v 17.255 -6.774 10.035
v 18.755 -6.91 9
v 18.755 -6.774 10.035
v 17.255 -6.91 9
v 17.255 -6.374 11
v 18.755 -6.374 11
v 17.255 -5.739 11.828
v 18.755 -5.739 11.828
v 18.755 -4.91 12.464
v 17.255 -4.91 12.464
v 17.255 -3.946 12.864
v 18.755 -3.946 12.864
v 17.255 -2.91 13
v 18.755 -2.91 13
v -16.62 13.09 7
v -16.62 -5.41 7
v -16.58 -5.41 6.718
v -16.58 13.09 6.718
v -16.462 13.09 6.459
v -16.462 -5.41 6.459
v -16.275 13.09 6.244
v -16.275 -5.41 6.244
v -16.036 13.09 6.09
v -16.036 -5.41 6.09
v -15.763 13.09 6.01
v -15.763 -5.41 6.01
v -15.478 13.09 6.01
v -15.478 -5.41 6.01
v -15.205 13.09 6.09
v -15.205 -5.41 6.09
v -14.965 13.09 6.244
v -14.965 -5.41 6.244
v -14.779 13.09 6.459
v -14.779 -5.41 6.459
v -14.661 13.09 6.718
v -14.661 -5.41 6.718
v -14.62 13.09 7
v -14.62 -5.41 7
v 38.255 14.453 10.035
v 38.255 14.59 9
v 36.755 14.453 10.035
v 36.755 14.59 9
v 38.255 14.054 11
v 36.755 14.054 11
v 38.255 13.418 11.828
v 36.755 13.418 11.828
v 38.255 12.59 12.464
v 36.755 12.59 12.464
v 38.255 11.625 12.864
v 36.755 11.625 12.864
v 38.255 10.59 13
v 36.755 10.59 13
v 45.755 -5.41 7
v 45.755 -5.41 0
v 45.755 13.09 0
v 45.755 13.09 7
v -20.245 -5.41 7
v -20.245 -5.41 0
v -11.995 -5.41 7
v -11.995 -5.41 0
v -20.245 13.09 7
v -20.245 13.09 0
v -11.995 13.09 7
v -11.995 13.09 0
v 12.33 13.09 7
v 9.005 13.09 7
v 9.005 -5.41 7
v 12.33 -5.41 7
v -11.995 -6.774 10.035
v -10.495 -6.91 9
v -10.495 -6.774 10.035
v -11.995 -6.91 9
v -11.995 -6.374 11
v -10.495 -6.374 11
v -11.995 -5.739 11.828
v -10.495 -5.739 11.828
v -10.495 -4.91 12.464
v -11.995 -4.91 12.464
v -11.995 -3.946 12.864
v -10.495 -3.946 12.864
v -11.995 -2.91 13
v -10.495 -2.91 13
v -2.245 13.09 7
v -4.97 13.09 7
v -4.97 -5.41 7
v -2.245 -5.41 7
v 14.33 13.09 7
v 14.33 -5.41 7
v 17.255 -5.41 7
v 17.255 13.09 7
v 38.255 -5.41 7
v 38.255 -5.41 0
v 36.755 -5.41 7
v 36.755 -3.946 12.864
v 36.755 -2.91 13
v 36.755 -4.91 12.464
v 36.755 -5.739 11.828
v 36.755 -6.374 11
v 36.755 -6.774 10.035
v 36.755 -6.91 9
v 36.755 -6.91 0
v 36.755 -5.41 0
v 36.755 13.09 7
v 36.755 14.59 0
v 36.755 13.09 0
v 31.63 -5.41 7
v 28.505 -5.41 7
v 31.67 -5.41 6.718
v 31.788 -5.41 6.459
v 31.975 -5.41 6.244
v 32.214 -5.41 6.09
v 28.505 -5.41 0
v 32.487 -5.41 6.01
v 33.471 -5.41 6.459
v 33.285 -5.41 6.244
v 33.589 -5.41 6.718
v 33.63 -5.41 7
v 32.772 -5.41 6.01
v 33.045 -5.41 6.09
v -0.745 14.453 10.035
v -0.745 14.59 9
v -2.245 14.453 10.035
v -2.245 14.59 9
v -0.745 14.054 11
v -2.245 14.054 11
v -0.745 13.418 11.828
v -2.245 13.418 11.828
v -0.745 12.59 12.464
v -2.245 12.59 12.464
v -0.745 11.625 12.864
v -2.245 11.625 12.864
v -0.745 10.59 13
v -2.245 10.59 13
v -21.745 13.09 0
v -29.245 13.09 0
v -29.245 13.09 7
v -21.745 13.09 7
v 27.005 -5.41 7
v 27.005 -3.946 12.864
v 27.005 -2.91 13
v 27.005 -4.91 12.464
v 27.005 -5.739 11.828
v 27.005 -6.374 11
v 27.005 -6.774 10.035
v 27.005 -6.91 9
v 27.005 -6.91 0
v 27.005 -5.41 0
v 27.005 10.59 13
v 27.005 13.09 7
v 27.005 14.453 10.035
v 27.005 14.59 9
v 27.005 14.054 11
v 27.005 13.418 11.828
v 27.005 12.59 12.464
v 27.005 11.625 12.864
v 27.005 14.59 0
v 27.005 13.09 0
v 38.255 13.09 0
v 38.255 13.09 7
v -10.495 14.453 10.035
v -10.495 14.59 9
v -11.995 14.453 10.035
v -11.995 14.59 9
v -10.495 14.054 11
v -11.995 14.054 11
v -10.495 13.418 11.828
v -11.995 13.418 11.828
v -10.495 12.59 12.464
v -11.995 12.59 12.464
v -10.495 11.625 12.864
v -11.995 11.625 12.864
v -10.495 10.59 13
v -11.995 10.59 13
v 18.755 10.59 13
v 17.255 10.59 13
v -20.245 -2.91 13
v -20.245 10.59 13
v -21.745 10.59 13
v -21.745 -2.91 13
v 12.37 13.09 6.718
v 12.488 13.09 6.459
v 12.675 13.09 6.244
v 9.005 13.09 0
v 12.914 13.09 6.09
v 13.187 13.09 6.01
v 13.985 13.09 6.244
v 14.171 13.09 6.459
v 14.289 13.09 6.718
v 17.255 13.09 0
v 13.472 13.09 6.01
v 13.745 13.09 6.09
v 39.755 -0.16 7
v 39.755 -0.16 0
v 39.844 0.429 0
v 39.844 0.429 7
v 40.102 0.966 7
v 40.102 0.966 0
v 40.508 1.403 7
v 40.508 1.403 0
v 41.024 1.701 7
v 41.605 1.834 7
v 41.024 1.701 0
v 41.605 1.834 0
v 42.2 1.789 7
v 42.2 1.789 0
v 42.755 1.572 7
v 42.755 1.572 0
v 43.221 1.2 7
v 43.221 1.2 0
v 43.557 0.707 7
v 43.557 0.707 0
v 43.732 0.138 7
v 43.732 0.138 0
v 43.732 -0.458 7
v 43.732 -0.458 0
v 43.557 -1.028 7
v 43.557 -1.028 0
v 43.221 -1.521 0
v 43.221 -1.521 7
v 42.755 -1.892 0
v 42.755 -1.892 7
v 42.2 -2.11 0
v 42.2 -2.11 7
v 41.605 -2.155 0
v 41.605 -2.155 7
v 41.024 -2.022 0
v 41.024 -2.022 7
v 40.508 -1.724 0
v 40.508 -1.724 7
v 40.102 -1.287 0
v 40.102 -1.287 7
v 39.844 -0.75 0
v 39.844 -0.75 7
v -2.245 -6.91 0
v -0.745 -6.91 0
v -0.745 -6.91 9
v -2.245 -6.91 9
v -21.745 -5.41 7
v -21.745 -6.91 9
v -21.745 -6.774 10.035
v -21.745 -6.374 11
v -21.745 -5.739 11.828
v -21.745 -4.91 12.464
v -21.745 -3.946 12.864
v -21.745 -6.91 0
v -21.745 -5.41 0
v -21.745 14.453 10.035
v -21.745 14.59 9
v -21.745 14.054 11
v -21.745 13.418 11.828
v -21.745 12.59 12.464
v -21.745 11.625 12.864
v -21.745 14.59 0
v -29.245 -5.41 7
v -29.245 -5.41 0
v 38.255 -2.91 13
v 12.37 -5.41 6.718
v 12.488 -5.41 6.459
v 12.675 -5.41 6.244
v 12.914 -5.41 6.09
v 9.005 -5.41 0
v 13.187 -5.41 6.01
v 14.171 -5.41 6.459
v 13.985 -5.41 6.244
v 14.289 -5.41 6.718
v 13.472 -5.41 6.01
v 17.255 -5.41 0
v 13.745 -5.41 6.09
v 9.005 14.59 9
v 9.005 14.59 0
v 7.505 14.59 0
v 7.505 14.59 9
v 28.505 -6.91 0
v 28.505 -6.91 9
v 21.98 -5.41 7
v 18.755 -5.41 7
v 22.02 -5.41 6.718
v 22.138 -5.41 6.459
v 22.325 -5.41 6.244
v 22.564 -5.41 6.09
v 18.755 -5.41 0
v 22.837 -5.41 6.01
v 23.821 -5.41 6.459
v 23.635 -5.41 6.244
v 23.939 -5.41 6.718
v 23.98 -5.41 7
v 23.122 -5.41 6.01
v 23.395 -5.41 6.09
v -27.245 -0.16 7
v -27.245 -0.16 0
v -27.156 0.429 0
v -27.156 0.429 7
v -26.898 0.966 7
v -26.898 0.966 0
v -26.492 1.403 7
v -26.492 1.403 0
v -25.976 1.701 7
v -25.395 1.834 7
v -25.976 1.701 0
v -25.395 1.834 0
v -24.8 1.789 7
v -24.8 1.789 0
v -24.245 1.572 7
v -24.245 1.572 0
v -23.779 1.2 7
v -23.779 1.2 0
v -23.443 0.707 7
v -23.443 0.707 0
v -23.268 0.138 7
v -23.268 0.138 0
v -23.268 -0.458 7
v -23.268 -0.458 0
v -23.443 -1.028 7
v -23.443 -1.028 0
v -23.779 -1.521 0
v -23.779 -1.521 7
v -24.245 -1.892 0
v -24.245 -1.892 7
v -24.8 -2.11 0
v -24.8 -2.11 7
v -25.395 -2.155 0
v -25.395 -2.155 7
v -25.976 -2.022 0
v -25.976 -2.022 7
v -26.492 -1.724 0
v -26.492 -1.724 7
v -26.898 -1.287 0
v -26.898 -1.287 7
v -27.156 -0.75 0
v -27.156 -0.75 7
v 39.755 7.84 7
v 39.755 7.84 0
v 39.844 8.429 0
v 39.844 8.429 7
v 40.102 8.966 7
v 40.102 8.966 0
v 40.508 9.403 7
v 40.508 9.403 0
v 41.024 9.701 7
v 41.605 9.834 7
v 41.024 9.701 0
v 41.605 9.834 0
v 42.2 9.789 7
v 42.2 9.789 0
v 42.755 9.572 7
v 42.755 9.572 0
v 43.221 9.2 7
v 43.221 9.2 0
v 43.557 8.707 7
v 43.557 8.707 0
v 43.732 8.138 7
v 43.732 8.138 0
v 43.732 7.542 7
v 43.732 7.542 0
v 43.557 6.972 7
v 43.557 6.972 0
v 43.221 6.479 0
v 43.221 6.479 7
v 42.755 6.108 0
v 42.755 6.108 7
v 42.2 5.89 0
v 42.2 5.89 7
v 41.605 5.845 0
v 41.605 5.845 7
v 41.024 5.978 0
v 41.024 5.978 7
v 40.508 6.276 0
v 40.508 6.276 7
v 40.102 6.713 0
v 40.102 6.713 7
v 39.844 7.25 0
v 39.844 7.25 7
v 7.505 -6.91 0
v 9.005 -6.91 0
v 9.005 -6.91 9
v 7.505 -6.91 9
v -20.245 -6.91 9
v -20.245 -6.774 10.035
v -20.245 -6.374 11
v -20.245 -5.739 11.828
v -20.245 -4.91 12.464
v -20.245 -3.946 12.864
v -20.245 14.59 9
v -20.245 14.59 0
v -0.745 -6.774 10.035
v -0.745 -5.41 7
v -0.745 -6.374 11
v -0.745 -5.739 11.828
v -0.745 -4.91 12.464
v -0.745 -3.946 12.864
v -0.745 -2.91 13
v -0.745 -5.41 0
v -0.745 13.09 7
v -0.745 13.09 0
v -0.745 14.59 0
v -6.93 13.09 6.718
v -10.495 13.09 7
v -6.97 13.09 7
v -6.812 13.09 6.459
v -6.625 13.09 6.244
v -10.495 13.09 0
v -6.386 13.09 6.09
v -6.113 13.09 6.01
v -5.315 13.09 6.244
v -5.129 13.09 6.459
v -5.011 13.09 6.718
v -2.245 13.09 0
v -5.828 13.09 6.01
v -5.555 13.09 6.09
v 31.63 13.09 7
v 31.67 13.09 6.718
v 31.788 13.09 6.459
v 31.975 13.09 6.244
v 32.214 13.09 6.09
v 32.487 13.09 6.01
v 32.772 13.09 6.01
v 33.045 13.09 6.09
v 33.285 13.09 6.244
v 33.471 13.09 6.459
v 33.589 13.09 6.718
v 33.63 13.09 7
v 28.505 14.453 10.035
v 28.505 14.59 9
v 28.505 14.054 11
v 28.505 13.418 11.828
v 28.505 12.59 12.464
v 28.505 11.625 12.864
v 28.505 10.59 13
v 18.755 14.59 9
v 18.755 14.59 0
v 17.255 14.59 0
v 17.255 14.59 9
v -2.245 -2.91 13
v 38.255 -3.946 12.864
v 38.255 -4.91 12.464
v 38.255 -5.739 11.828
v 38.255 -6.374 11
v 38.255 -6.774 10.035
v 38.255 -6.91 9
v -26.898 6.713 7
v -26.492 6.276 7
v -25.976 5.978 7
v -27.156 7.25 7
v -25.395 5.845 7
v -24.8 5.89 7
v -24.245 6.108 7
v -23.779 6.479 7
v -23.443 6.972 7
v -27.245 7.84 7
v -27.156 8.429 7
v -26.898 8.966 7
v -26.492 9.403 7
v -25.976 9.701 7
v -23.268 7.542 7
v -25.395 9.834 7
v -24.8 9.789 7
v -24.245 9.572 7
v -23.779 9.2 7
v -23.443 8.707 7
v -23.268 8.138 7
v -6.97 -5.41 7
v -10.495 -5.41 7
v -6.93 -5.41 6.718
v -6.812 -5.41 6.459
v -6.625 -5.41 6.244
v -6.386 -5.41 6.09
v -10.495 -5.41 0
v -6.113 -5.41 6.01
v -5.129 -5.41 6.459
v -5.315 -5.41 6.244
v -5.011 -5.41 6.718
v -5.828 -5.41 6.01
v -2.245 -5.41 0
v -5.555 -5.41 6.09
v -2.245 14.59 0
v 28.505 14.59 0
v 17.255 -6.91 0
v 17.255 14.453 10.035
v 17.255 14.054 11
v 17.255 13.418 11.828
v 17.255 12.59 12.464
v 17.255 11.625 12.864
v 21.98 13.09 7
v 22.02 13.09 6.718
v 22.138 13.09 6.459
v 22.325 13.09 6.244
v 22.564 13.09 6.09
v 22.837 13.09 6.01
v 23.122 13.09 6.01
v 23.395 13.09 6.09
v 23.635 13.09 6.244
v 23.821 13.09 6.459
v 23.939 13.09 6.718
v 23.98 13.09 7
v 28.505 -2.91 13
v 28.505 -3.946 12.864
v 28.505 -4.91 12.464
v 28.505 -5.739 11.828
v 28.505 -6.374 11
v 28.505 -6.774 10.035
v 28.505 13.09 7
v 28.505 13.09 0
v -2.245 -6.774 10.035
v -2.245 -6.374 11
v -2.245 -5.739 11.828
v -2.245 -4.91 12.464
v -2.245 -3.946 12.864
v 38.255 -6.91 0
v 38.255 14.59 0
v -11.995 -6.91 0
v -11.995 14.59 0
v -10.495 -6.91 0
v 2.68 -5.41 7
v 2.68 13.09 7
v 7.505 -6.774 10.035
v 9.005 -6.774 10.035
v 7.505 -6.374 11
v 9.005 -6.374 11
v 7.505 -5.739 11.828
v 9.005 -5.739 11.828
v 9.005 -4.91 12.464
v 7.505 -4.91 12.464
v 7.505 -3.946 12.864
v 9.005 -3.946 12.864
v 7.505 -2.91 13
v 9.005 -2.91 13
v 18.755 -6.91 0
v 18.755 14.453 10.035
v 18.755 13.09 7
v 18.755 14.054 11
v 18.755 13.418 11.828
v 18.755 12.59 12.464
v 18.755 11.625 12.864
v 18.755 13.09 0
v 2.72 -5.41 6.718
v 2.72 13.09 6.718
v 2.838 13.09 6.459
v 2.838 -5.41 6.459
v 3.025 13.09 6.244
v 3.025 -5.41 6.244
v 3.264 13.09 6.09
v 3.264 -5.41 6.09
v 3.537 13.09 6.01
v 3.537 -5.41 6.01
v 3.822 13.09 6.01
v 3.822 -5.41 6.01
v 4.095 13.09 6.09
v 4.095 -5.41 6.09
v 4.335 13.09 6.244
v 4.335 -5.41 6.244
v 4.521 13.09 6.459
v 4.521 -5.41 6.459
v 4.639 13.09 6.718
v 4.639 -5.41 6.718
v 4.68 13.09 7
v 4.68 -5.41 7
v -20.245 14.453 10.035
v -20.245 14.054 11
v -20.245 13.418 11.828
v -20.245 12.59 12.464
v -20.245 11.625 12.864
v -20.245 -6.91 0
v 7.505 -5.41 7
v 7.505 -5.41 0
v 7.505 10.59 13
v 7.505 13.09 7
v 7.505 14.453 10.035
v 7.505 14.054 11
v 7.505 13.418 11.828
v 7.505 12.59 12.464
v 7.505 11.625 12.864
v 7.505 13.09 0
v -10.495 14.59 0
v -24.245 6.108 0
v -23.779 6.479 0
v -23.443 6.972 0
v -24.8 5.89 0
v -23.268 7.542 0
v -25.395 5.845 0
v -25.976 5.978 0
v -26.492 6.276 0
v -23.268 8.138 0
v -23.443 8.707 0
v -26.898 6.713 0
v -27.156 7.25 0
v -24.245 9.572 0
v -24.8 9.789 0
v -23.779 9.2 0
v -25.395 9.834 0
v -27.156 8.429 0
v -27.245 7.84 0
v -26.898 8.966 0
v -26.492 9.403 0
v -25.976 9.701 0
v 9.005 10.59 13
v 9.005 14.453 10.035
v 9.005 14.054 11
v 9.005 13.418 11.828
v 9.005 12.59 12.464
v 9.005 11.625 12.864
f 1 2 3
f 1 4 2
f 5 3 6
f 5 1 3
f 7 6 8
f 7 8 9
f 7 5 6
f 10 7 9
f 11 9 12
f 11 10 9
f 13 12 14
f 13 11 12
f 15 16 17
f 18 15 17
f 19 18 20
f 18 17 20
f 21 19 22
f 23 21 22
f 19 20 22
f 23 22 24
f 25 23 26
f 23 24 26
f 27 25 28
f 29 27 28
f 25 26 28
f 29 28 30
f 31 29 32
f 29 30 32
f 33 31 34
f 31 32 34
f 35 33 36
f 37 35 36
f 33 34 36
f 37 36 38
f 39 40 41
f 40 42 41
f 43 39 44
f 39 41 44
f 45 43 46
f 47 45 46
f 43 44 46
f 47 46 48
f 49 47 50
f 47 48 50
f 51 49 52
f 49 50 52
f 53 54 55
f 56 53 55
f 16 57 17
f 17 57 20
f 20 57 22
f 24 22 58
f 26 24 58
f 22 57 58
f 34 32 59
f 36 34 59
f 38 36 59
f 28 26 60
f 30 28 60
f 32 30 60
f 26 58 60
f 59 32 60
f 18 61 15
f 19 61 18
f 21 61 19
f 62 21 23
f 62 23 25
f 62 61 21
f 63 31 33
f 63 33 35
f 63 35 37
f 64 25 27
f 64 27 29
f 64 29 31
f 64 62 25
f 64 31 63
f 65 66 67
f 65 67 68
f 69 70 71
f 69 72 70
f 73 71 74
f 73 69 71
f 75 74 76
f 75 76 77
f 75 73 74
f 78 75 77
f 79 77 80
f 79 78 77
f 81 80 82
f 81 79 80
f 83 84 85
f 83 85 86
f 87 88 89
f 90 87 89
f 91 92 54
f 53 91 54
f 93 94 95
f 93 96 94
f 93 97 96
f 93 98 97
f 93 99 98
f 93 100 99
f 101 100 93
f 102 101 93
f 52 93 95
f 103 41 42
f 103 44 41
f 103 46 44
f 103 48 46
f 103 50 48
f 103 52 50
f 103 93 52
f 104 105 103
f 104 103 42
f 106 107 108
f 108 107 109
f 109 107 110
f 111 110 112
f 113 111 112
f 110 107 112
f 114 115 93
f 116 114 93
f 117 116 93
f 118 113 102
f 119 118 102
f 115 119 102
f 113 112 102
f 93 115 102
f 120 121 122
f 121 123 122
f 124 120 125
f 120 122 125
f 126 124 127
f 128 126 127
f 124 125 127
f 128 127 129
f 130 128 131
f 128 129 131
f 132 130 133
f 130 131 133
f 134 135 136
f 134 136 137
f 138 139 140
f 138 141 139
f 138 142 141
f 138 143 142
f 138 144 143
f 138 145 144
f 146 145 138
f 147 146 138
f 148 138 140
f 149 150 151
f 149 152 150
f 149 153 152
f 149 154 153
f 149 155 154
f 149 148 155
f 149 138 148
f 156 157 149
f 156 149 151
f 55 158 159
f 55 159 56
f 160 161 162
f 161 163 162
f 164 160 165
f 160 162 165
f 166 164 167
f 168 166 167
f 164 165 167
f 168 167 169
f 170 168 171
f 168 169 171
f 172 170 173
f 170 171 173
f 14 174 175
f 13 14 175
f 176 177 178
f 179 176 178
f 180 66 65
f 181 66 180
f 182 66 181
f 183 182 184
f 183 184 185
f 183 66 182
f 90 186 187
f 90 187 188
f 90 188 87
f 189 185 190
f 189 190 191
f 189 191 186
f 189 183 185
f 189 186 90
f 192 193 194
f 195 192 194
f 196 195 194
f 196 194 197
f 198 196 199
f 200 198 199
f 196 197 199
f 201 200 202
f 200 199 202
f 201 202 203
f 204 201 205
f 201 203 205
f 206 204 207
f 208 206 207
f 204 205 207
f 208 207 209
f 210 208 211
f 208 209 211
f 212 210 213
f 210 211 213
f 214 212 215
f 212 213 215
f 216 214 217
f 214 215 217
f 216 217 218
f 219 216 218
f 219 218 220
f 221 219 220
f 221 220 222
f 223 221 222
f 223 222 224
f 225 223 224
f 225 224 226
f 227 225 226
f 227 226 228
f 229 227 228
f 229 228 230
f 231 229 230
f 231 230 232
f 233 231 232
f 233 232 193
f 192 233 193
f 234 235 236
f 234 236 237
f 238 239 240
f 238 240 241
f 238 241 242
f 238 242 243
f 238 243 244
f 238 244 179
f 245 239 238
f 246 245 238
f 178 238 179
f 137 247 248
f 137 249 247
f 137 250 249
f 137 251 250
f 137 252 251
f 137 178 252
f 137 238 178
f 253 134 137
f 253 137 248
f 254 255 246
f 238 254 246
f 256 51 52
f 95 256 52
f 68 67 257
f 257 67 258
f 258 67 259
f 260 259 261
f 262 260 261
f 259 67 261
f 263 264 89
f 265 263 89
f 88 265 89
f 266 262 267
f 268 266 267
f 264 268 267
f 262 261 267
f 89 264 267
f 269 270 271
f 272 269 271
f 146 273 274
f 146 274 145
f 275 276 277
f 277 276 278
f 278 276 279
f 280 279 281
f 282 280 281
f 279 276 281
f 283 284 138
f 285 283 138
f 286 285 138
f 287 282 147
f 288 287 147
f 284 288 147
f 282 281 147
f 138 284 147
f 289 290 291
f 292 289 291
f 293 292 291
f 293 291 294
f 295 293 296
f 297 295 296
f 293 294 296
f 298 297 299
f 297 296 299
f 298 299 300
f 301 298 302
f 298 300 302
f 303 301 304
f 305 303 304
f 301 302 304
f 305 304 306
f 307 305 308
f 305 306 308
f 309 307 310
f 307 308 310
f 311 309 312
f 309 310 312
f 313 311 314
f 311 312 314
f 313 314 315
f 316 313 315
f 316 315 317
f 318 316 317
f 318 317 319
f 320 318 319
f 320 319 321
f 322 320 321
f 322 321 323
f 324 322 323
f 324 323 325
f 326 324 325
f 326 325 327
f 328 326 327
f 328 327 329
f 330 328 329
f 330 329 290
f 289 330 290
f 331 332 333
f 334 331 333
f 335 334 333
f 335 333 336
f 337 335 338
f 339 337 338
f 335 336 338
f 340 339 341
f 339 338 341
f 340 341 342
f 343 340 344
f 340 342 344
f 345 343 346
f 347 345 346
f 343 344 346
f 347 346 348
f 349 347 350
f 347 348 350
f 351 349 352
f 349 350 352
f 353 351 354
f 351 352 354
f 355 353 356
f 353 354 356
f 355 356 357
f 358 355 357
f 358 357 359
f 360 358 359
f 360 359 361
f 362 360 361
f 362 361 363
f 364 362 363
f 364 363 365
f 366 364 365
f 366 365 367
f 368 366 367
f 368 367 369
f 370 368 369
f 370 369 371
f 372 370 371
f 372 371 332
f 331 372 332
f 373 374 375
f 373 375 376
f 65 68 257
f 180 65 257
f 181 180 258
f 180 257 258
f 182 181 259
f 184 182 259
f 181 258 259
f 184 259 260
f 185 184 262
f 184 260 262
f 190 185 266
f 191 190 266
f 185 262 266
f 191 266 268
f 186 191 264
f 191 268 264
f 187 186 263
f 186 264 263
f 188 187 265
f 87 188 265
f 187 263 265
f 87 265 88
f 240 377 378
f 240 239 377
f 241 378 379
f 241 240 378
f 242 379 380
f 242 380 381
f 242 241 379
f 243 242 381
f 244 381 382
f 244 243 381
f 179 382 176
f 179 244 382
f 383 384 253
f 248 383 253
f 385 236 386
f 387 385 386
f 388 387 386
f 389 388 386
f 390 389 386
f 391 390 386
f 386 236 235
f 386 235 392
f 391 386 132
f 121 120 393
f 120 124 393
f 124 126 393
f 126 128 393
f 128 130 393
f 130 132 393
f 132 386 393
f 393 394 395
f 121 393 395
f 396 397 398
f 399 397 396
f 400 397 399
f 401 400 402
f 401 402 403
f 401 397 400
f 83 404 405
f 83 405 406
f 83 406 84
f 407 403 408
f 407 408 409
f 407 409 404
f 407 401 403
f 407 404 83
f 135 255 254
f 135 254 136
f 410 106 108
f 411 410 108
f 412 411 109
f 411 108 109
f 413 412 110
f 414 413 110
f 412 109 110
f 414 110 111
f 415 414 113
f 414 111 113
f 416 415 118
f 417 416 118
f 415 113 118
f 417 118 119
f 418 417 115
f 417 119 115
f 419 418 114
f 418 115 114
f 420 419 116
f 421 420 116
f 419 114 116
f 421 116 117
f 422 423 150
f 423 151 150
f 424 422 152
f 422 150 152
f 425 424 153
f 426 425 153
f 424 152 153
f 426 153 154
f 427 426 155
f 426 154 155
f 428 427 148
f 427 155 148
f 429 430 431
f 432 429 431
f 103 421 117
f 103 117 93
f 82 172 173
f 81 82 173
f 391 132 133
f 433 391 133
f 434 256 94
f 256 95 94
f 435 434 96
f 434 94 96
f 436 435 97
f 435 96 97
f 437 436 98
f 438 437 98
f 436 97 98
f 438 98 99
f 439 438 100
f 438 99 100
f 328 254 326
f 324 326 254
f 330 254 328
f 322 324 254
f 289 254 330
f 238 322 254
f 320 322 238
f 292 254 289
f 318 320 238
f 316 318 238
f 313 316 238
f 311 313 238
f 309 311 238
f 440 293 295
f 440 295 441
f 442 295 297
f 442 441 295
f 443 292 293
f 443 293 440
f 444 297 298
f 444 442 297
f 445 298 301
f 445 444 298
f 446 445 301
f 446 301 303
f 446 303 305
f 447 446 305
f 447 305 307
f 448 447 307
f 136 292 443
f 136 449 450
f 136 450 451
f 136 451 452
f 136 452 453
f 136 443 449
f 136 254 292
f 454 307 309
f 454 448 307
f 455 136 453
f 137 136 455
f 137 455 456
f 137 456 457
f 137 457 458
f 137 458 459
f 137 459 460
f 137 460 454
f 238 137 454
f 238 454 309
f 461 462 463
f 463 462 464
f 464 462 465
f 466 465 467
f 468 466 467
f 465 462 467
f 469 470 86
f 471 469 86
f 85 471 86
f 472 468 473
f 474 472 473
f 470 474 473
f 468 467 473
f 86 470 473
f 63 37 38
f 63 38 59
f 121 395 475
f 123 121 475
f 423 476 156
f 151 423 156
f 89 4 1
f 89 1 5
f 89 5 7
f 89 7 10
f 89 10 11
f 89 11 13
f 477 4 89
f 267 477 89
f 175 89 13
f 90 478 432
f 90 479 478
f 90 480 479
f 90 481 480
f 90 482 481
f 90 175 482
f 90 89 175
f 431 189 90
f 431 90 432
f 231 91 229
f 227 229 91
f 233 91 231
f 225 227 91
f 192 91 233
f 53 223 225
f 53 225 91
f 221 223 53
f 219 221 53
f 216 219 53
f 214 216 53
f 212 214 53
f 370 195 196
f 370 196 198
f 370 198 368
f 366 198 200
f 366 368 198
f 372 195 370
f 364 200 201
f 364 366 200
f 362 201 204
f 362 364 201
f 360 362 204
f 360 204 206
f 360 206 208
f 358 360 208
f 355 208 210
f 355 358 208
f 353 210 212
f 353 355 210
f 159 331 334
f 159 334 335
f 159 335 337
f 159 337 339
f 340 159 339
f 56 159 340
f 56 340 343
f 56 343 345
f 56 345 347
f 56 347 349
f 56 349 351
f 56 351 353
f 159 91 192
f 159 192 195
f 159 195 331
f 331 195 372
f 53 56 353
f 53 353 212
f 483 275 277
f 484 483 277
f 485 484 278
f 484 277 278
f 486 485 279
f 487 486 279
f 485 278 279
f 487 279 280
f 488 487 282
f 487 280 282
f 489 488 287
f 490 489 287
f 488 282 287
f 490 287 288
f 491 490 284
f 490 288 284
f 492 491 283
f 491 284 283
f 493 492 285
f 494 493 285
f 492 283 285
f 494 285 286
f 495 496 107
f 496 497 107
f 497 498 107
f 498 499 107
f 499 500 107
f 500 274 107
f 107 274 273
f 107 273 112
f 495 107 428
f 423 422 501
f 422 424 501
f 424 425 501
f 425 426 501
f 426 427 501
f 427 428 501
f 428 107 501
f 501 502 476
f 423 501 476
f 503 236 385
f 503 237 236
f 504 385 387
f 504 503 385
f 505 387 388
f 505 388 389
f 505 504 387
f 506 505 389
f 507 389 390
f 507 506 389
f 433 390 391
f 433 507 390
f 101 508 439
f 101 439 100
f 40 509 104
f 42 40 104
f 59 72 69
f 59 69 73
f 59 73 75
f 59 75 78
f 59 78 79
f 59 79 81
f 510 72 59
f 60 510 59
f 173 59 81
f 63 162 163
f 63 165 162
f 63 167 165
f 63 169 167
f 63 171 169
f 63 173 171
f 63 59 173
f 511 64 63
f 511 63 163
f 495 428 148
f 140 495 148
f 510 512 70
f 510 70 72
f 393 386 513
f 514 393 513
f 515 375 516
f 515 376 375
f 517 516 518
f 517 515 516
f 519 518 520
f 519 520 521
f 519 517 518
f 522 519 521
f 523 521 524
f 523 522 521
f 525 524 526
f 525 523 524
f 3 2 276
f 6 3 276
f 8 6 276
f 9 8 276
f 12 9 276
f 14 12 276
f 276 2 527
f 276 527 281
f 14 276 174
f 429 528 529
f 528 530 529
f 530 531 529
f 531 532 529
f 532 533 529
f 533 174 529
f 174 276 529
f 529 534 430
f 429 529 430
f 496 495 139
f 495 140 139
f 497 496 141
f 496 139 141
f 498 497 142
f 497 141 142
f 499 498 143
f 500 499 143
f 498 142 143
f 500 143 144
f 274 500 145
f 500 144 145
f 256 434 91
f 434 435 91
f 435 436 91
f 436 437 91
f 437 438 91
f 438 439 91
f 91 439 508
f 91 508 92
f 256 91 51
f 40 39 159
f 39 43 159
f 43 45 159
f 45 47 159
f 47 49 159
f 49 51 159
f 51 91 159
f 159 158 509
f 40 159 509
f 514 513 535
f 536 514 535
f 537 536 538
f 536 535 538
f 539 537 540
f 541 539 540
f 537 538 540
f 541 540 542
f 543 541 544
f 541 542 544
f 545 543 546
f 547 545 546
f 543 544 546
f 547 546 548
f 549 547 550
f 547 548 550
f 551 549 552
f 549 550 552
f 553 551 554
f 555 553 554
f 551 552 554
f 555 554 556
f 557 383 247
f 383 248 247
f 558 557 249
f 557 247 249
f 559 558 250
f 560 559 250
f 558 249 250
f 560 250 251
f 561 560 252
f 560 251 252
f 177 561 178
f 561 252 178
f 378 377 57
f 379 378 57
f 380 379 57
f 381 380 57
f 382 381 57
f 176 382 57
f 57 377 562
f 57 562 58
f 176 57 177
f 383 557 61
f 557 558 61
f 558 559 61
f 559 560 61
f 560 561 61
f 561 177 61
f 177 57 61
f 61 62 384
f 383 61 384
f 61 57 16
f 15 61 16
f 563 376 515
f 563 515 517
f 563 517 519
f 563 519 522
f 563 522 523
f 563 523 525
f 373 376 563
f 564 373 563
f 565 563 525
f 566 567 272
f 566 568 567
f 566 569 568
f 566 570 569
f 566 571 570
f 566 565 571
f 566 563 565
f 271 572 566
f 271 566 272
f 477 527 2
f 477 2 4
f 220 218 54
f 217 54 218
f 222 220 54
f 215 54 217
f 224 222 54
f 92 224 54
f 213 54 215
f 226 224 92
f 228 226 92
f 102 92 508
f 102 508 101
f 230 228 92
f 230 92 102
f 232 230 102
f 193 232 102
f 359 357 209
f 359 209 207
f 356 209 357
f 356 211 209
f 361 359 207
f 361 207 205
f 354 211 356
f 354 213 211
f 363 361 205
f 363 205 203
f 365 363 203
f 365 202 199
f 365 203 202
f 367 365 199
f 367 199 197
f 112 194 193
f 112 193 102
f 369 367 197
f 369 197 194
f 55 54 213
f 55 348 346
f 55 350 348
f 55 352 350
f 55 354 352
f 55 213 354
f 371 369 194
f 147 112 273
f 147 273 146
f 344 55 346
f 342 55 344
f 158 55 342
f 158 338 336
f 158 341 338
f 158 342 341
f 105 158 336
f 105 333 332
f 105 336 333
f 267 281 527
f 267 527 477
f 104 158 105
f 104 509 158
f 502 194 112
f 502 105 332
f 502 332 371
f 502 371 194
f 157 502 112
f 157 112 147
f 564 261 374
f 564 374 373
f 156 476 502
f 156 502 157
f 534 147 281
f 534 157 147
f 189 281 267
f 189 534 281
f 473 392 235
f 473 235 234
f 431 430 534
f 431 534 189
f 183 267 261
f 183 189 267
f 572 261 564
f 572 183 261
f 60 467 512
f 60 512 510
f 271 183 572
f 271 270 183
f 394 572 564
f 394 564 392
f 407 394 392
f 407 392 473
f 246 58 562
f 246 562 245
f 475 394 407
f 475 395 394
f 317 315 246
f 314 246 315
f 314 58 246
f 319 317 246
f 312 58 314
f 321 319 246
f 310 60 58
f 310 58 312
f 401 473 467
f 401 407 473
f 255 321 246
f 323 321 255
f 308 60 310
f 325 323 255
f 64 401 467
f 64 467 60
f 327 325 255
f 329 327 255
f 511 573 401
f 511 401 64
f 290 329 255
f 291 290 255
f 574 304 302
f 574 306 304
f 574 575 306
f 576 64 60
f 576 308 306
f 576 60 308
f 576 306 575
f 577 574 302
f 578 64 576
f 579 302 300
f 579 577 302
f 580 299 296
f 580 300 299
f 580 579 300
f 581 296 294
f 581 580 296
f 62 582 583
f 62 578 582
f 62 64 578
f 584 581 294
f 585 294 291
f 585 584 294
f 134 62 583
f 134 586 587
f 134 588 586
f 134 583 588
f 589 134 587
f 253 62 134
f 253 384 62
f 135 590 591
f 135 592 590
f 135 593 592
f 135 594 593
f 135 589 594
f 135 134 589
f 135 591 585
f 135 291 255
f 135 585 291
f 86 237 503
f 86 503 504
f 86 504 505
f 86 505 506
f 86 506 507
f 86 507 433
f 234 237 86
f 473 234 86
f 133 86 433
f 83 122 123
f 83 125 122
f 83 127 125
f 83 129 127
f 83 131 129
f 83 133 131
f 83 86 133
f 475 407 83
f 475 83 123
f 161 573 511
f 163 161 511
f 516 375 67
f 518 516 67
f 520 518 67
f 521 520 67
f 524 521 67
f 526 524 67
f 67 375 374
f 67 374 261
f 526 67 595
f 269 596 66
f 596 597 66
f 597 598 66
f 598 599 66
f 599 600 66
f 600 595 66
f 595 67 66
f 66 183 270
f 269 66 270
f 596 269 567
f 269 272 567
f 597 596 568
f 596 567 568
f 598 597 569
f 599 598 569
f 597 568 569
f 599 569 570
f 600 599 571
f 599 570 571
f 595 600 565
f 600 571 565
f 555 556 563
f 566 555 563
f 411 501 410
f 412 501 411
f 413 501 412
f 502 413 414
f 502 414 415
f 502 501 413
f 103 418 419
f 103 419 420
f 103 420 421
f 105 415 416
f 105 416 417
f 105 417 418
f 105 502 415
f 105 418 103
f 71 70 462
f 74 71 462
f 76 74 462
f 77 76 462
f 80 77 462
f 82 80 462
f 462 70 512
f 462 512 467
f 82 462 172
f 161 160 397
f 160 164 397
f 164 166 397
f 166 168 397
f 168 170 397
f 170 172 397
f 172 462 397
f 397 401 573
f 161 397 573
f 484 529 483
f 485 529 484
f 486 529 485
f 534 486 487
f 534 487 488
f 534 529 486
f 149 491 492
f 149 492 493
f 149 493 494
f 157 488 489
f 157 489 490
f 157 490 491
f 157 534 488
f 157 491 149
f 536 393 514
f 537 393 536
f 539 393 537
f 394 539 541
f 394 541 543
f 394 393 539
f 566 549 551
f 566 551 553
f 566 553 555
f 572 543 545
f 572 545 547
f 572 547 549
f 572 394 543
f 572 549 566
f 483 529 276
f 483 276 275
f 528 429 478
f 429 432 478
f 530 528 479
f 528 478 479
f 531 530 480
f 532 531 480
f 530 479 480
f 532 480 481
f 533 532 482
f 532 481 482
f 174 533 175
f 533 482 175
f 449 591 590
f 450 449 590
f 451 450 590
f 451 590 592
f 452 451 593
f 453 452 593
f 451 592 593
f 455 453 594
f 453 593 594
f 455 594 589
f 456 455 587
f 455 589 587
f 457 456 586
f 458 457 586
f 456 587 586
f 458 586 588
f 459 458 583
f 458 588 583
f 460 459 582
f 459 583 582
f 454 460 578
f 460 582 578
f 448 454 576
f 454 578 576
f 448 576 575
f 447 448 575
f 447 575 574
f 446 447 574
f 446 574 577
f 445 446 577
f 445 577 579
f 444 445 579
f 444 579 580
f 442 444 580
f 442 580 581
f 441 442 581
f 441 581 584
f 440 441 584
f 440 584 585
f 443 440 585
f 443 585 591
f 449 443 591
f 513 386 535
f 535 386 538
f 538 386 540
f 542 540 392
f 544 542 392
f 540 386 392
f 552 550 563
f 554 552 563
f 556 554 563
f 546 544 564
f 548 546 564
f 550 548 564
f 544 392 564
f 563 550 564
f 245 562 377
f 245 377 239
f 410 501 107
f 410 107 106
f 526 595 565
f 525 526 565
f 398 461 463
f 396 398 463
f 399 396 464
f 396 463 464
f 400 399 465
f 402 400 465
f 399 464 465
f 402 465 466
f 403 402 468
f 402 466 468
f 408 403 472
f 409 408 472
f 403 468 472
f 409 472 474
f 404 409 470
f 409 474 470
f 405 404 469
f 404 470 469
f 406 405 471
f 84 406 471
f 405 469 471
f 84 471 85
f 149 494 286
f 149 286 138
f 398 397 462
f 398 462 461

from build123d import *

# Parameters (mm, degrees)
ESQUISSE1_W                = 75
ESQUISSE1_H                = 18.5
BOSS_EXTRU_1_DEPTH         = 7
ENL_V_MAT_EXTRU_1_REACH    = 9
ESQUISSE2_R                = 2
ESQUISSE3_W                = 1.5
ESQUISSE3_H                = 21.5
BOSS_EXTRU_2_DEPTH         = 13
CONG_1_R                   = 4
ESQUISSE4_R                = 1
ENL_V_MAT_EXTRU_2_DEPTH    = 18.5
R_P_TITION_LIN_AIRE1_COUNT = 6
R_P_TITION_LIN_AIRE1_PITCH = 9.65


with BuildPart() as part:
    # Esquisse1 → Boss.-Extru.1 (new body)
    with BuildSketch(Plane.XY):
        with Locations((8.254716981, 3.839622642)):
            Rectangle(ESQUISSE1_W, ESQUISSE1_H)
    extrude(amount=BOSS_EXTRU_1_DEPTH)

    # Esquisse2 → Enlèv. mat.-Extru.1 (cut, up to next)
    with BuildSketch(Plane(origin=(0, 0, 0), x_dir=(-1, 0, 0), z_dir=(0, 0, -1)), mode=Mode.PRIVATE) as enl_v_mat_extru_1_sk1:
        with Locations((-41.754716981, 7.839622642)):
            Circle(ESQUISSE2_R)
    enl_v_mat_extru_1_tool1 = extrude(enl_v_mat_extru_1_sk1.sketch, amount=-ENL_V_MAT_EXTRU_1_REACH, mode=Mode.PRIVATE) & part.part
    add(enl_v_mat_extru_1_tool1.solids().sort_by_distance((41.754717, 7.839623, 0))[0], mode=Mode.SUBTRACT)
    # Esquisse2 → Enlèv. mat.-Extru.1 (cut, up to next)
    with BuildSketch(Plane(origin=(0, 0, 0), x_dir=(-1, 0, 0), z_dir=(0, 0, -1)), mode=Mode.PRIVATE) as enl_v_mat_extru_1_sk2:
        with Locations((-41.754716981, -0.160377358)):
            Circle(ESQUISSE2_R)
    enl_v_mat_extru_1_tool2 = extrude(enl_v_mat_extru_1_sk2.sketch, amount=-ENL_V_MAT_EXTRU_1_REACH, mode=Mode.PRIVATE) & part.part
    add(enl_v_mat_extru_1_tool2.solids().sort_by_distance((41.754717, -0.160377, 0))[0], mode=Mode.SUBTRACT)
    # Esquisse2 → Enlèv. mat.-Extru.1 (cut, up to next)
    with BuildSketch(Plane(origin=(0, 0, 0), x_dir=(-1, 0, 0), z_dir=(0, 0, -1)), mode=Mode.PRIVATE) as enl_v_mat_extru_1_sk3:
        with Locations((25.245283019, -0.160377358)):
            Circle(ESQUISSE2_R)
    enl_v_mat_extru_1_tool3 = extrude(enl_v_mat_extru_1_sk3.sketch, amount=-ENL_V_MAT_EXTRU_1_REACH, mode=Mode.PRIVATE) & part.part
    add(enl_v_mat_extru_1_tool3.solids().sort_by_distance((-25.245283, -0.160377, 0))[0], mode=Mode.SUBTRACT)
    # Esquisse2 → Enlèv. mat.-Extru.1 (cut, up to next)
    with BuildSketch(Plane(origin=(0, 0, 0), x_dir=(-1, 0, 0), z_dir=(0, 0, -1)), mode=Mode.PRIVATE) as enl_v_mat_extru_1_sk4:
        with Locations((25.245283019, 7.839622642)):
            Circle(ESQUISSE2_R)
    enl_v_mat_extru_1_tool4 = extrude(enl_v_mat_extru_1_sk4.sketch, amount=-ENL_V_MAT_EXTRU_1_REACH, mode=Mode.PRIVATE) & part.part
    add(enl_v_mat_extru_1_tool4.solids().sort_by_distance((-25.245283, 7.839623, 0))[0], mode=Mode.SUBTRACT)

    # Esquisse3 → Boss.-Extru.2 (add)
    with BuildSketch(Plane(origin=(0, 0, 0), x_dir=(-1, 0, 0), z_dir=(0, 0, -1))):
        with Locations((-37.504716981, 3.839622642)):
            Rectangle(ESQUISSE3_W, ESQUISSE3_H)
        with Locations((-27.754716981, 3.839622642)):
            Rectangle(ESQUISSE3_W, ESQUISSE3_H)
        with Locations((-18.004716981, 3.839622642)):
            Rectangle(ESQUISSE3_W, ESQUISSE3_H)
        with Locations((-8.254716981, 3.839622642)):
            Rectangle(ESQUISSE3_W, ESQUISSE3_H)
        with Locations((1.495283019, 3.839622642)):
            Rectangle(ESQUISSE3_W, ESQUISSE3_H)
        with Locations((11.245283019, 3.839622642)):
            Rectangle(ESQUISSE3_W, ESQUISSE3_H)
        with Locations((20.995283019, 3.839622642)):
            Rectangle(ESQUISSE3_W, ESQUISSE3_H)
    extrude(amount=-BOSS_EXTRU_2_DEPTH)

    # Congé1
    cong_1_edges = [part.edges().sort_by_distance(p)[0] for p in [
        (8.254716981, -6.910377358, 13),
        (8.254716981, 14.589622642, 13),
        (-1.495283019, -6.910377358, 13),
        (-1.495283019, 14.589622642, 13),
        (-11.245283019, -6.910377358, 13),
        (-11.245283019, 14.589622642, 13),
        (-20.995283019, -6.910377358, 13),
        (-20.995283019, 14.589622642, 13),
        (37.504716981, 14.589622642, 13),
        (37.504716981, -6.910377358, 13),
        (27.754716981, -6.910377358, 13),
        (27.754716981, 14.589622642, 13),
        (18.004716981, -6.910377358, 13),
        (18.004716981, 14.589622642, 13),
    ]]
    fillet(cong_1_edges, radius=CONG_1_R)

    # Esquisse4 → Enlèv. mat.-Extru.2 (cut)
    with BuildSketch(Plane.XZ.offset(5.410377358)):
        with Locations((32.629716981, 7)):
            Circle(ESQUISSE4_R)
    enl_v_mat_extru_2 = extrude(amount=-ENL_V_MAT_EXTRU_2_DEPTH, mode=Mode.SUBTRACT)

    # Répétition linéaire1: Enlèv. mat.-Extru.2 ×6
    with Locations(*[(-i * R_P_TITION_LIN_AIRE1_PITCH, 0, 0) for i in range(1, R_P_TITION_LIN_AIRE1_COUNT)]):
        add(enl_v_mat_extru_2, mode=Mode.SUBTRACT)


solid = part.part
